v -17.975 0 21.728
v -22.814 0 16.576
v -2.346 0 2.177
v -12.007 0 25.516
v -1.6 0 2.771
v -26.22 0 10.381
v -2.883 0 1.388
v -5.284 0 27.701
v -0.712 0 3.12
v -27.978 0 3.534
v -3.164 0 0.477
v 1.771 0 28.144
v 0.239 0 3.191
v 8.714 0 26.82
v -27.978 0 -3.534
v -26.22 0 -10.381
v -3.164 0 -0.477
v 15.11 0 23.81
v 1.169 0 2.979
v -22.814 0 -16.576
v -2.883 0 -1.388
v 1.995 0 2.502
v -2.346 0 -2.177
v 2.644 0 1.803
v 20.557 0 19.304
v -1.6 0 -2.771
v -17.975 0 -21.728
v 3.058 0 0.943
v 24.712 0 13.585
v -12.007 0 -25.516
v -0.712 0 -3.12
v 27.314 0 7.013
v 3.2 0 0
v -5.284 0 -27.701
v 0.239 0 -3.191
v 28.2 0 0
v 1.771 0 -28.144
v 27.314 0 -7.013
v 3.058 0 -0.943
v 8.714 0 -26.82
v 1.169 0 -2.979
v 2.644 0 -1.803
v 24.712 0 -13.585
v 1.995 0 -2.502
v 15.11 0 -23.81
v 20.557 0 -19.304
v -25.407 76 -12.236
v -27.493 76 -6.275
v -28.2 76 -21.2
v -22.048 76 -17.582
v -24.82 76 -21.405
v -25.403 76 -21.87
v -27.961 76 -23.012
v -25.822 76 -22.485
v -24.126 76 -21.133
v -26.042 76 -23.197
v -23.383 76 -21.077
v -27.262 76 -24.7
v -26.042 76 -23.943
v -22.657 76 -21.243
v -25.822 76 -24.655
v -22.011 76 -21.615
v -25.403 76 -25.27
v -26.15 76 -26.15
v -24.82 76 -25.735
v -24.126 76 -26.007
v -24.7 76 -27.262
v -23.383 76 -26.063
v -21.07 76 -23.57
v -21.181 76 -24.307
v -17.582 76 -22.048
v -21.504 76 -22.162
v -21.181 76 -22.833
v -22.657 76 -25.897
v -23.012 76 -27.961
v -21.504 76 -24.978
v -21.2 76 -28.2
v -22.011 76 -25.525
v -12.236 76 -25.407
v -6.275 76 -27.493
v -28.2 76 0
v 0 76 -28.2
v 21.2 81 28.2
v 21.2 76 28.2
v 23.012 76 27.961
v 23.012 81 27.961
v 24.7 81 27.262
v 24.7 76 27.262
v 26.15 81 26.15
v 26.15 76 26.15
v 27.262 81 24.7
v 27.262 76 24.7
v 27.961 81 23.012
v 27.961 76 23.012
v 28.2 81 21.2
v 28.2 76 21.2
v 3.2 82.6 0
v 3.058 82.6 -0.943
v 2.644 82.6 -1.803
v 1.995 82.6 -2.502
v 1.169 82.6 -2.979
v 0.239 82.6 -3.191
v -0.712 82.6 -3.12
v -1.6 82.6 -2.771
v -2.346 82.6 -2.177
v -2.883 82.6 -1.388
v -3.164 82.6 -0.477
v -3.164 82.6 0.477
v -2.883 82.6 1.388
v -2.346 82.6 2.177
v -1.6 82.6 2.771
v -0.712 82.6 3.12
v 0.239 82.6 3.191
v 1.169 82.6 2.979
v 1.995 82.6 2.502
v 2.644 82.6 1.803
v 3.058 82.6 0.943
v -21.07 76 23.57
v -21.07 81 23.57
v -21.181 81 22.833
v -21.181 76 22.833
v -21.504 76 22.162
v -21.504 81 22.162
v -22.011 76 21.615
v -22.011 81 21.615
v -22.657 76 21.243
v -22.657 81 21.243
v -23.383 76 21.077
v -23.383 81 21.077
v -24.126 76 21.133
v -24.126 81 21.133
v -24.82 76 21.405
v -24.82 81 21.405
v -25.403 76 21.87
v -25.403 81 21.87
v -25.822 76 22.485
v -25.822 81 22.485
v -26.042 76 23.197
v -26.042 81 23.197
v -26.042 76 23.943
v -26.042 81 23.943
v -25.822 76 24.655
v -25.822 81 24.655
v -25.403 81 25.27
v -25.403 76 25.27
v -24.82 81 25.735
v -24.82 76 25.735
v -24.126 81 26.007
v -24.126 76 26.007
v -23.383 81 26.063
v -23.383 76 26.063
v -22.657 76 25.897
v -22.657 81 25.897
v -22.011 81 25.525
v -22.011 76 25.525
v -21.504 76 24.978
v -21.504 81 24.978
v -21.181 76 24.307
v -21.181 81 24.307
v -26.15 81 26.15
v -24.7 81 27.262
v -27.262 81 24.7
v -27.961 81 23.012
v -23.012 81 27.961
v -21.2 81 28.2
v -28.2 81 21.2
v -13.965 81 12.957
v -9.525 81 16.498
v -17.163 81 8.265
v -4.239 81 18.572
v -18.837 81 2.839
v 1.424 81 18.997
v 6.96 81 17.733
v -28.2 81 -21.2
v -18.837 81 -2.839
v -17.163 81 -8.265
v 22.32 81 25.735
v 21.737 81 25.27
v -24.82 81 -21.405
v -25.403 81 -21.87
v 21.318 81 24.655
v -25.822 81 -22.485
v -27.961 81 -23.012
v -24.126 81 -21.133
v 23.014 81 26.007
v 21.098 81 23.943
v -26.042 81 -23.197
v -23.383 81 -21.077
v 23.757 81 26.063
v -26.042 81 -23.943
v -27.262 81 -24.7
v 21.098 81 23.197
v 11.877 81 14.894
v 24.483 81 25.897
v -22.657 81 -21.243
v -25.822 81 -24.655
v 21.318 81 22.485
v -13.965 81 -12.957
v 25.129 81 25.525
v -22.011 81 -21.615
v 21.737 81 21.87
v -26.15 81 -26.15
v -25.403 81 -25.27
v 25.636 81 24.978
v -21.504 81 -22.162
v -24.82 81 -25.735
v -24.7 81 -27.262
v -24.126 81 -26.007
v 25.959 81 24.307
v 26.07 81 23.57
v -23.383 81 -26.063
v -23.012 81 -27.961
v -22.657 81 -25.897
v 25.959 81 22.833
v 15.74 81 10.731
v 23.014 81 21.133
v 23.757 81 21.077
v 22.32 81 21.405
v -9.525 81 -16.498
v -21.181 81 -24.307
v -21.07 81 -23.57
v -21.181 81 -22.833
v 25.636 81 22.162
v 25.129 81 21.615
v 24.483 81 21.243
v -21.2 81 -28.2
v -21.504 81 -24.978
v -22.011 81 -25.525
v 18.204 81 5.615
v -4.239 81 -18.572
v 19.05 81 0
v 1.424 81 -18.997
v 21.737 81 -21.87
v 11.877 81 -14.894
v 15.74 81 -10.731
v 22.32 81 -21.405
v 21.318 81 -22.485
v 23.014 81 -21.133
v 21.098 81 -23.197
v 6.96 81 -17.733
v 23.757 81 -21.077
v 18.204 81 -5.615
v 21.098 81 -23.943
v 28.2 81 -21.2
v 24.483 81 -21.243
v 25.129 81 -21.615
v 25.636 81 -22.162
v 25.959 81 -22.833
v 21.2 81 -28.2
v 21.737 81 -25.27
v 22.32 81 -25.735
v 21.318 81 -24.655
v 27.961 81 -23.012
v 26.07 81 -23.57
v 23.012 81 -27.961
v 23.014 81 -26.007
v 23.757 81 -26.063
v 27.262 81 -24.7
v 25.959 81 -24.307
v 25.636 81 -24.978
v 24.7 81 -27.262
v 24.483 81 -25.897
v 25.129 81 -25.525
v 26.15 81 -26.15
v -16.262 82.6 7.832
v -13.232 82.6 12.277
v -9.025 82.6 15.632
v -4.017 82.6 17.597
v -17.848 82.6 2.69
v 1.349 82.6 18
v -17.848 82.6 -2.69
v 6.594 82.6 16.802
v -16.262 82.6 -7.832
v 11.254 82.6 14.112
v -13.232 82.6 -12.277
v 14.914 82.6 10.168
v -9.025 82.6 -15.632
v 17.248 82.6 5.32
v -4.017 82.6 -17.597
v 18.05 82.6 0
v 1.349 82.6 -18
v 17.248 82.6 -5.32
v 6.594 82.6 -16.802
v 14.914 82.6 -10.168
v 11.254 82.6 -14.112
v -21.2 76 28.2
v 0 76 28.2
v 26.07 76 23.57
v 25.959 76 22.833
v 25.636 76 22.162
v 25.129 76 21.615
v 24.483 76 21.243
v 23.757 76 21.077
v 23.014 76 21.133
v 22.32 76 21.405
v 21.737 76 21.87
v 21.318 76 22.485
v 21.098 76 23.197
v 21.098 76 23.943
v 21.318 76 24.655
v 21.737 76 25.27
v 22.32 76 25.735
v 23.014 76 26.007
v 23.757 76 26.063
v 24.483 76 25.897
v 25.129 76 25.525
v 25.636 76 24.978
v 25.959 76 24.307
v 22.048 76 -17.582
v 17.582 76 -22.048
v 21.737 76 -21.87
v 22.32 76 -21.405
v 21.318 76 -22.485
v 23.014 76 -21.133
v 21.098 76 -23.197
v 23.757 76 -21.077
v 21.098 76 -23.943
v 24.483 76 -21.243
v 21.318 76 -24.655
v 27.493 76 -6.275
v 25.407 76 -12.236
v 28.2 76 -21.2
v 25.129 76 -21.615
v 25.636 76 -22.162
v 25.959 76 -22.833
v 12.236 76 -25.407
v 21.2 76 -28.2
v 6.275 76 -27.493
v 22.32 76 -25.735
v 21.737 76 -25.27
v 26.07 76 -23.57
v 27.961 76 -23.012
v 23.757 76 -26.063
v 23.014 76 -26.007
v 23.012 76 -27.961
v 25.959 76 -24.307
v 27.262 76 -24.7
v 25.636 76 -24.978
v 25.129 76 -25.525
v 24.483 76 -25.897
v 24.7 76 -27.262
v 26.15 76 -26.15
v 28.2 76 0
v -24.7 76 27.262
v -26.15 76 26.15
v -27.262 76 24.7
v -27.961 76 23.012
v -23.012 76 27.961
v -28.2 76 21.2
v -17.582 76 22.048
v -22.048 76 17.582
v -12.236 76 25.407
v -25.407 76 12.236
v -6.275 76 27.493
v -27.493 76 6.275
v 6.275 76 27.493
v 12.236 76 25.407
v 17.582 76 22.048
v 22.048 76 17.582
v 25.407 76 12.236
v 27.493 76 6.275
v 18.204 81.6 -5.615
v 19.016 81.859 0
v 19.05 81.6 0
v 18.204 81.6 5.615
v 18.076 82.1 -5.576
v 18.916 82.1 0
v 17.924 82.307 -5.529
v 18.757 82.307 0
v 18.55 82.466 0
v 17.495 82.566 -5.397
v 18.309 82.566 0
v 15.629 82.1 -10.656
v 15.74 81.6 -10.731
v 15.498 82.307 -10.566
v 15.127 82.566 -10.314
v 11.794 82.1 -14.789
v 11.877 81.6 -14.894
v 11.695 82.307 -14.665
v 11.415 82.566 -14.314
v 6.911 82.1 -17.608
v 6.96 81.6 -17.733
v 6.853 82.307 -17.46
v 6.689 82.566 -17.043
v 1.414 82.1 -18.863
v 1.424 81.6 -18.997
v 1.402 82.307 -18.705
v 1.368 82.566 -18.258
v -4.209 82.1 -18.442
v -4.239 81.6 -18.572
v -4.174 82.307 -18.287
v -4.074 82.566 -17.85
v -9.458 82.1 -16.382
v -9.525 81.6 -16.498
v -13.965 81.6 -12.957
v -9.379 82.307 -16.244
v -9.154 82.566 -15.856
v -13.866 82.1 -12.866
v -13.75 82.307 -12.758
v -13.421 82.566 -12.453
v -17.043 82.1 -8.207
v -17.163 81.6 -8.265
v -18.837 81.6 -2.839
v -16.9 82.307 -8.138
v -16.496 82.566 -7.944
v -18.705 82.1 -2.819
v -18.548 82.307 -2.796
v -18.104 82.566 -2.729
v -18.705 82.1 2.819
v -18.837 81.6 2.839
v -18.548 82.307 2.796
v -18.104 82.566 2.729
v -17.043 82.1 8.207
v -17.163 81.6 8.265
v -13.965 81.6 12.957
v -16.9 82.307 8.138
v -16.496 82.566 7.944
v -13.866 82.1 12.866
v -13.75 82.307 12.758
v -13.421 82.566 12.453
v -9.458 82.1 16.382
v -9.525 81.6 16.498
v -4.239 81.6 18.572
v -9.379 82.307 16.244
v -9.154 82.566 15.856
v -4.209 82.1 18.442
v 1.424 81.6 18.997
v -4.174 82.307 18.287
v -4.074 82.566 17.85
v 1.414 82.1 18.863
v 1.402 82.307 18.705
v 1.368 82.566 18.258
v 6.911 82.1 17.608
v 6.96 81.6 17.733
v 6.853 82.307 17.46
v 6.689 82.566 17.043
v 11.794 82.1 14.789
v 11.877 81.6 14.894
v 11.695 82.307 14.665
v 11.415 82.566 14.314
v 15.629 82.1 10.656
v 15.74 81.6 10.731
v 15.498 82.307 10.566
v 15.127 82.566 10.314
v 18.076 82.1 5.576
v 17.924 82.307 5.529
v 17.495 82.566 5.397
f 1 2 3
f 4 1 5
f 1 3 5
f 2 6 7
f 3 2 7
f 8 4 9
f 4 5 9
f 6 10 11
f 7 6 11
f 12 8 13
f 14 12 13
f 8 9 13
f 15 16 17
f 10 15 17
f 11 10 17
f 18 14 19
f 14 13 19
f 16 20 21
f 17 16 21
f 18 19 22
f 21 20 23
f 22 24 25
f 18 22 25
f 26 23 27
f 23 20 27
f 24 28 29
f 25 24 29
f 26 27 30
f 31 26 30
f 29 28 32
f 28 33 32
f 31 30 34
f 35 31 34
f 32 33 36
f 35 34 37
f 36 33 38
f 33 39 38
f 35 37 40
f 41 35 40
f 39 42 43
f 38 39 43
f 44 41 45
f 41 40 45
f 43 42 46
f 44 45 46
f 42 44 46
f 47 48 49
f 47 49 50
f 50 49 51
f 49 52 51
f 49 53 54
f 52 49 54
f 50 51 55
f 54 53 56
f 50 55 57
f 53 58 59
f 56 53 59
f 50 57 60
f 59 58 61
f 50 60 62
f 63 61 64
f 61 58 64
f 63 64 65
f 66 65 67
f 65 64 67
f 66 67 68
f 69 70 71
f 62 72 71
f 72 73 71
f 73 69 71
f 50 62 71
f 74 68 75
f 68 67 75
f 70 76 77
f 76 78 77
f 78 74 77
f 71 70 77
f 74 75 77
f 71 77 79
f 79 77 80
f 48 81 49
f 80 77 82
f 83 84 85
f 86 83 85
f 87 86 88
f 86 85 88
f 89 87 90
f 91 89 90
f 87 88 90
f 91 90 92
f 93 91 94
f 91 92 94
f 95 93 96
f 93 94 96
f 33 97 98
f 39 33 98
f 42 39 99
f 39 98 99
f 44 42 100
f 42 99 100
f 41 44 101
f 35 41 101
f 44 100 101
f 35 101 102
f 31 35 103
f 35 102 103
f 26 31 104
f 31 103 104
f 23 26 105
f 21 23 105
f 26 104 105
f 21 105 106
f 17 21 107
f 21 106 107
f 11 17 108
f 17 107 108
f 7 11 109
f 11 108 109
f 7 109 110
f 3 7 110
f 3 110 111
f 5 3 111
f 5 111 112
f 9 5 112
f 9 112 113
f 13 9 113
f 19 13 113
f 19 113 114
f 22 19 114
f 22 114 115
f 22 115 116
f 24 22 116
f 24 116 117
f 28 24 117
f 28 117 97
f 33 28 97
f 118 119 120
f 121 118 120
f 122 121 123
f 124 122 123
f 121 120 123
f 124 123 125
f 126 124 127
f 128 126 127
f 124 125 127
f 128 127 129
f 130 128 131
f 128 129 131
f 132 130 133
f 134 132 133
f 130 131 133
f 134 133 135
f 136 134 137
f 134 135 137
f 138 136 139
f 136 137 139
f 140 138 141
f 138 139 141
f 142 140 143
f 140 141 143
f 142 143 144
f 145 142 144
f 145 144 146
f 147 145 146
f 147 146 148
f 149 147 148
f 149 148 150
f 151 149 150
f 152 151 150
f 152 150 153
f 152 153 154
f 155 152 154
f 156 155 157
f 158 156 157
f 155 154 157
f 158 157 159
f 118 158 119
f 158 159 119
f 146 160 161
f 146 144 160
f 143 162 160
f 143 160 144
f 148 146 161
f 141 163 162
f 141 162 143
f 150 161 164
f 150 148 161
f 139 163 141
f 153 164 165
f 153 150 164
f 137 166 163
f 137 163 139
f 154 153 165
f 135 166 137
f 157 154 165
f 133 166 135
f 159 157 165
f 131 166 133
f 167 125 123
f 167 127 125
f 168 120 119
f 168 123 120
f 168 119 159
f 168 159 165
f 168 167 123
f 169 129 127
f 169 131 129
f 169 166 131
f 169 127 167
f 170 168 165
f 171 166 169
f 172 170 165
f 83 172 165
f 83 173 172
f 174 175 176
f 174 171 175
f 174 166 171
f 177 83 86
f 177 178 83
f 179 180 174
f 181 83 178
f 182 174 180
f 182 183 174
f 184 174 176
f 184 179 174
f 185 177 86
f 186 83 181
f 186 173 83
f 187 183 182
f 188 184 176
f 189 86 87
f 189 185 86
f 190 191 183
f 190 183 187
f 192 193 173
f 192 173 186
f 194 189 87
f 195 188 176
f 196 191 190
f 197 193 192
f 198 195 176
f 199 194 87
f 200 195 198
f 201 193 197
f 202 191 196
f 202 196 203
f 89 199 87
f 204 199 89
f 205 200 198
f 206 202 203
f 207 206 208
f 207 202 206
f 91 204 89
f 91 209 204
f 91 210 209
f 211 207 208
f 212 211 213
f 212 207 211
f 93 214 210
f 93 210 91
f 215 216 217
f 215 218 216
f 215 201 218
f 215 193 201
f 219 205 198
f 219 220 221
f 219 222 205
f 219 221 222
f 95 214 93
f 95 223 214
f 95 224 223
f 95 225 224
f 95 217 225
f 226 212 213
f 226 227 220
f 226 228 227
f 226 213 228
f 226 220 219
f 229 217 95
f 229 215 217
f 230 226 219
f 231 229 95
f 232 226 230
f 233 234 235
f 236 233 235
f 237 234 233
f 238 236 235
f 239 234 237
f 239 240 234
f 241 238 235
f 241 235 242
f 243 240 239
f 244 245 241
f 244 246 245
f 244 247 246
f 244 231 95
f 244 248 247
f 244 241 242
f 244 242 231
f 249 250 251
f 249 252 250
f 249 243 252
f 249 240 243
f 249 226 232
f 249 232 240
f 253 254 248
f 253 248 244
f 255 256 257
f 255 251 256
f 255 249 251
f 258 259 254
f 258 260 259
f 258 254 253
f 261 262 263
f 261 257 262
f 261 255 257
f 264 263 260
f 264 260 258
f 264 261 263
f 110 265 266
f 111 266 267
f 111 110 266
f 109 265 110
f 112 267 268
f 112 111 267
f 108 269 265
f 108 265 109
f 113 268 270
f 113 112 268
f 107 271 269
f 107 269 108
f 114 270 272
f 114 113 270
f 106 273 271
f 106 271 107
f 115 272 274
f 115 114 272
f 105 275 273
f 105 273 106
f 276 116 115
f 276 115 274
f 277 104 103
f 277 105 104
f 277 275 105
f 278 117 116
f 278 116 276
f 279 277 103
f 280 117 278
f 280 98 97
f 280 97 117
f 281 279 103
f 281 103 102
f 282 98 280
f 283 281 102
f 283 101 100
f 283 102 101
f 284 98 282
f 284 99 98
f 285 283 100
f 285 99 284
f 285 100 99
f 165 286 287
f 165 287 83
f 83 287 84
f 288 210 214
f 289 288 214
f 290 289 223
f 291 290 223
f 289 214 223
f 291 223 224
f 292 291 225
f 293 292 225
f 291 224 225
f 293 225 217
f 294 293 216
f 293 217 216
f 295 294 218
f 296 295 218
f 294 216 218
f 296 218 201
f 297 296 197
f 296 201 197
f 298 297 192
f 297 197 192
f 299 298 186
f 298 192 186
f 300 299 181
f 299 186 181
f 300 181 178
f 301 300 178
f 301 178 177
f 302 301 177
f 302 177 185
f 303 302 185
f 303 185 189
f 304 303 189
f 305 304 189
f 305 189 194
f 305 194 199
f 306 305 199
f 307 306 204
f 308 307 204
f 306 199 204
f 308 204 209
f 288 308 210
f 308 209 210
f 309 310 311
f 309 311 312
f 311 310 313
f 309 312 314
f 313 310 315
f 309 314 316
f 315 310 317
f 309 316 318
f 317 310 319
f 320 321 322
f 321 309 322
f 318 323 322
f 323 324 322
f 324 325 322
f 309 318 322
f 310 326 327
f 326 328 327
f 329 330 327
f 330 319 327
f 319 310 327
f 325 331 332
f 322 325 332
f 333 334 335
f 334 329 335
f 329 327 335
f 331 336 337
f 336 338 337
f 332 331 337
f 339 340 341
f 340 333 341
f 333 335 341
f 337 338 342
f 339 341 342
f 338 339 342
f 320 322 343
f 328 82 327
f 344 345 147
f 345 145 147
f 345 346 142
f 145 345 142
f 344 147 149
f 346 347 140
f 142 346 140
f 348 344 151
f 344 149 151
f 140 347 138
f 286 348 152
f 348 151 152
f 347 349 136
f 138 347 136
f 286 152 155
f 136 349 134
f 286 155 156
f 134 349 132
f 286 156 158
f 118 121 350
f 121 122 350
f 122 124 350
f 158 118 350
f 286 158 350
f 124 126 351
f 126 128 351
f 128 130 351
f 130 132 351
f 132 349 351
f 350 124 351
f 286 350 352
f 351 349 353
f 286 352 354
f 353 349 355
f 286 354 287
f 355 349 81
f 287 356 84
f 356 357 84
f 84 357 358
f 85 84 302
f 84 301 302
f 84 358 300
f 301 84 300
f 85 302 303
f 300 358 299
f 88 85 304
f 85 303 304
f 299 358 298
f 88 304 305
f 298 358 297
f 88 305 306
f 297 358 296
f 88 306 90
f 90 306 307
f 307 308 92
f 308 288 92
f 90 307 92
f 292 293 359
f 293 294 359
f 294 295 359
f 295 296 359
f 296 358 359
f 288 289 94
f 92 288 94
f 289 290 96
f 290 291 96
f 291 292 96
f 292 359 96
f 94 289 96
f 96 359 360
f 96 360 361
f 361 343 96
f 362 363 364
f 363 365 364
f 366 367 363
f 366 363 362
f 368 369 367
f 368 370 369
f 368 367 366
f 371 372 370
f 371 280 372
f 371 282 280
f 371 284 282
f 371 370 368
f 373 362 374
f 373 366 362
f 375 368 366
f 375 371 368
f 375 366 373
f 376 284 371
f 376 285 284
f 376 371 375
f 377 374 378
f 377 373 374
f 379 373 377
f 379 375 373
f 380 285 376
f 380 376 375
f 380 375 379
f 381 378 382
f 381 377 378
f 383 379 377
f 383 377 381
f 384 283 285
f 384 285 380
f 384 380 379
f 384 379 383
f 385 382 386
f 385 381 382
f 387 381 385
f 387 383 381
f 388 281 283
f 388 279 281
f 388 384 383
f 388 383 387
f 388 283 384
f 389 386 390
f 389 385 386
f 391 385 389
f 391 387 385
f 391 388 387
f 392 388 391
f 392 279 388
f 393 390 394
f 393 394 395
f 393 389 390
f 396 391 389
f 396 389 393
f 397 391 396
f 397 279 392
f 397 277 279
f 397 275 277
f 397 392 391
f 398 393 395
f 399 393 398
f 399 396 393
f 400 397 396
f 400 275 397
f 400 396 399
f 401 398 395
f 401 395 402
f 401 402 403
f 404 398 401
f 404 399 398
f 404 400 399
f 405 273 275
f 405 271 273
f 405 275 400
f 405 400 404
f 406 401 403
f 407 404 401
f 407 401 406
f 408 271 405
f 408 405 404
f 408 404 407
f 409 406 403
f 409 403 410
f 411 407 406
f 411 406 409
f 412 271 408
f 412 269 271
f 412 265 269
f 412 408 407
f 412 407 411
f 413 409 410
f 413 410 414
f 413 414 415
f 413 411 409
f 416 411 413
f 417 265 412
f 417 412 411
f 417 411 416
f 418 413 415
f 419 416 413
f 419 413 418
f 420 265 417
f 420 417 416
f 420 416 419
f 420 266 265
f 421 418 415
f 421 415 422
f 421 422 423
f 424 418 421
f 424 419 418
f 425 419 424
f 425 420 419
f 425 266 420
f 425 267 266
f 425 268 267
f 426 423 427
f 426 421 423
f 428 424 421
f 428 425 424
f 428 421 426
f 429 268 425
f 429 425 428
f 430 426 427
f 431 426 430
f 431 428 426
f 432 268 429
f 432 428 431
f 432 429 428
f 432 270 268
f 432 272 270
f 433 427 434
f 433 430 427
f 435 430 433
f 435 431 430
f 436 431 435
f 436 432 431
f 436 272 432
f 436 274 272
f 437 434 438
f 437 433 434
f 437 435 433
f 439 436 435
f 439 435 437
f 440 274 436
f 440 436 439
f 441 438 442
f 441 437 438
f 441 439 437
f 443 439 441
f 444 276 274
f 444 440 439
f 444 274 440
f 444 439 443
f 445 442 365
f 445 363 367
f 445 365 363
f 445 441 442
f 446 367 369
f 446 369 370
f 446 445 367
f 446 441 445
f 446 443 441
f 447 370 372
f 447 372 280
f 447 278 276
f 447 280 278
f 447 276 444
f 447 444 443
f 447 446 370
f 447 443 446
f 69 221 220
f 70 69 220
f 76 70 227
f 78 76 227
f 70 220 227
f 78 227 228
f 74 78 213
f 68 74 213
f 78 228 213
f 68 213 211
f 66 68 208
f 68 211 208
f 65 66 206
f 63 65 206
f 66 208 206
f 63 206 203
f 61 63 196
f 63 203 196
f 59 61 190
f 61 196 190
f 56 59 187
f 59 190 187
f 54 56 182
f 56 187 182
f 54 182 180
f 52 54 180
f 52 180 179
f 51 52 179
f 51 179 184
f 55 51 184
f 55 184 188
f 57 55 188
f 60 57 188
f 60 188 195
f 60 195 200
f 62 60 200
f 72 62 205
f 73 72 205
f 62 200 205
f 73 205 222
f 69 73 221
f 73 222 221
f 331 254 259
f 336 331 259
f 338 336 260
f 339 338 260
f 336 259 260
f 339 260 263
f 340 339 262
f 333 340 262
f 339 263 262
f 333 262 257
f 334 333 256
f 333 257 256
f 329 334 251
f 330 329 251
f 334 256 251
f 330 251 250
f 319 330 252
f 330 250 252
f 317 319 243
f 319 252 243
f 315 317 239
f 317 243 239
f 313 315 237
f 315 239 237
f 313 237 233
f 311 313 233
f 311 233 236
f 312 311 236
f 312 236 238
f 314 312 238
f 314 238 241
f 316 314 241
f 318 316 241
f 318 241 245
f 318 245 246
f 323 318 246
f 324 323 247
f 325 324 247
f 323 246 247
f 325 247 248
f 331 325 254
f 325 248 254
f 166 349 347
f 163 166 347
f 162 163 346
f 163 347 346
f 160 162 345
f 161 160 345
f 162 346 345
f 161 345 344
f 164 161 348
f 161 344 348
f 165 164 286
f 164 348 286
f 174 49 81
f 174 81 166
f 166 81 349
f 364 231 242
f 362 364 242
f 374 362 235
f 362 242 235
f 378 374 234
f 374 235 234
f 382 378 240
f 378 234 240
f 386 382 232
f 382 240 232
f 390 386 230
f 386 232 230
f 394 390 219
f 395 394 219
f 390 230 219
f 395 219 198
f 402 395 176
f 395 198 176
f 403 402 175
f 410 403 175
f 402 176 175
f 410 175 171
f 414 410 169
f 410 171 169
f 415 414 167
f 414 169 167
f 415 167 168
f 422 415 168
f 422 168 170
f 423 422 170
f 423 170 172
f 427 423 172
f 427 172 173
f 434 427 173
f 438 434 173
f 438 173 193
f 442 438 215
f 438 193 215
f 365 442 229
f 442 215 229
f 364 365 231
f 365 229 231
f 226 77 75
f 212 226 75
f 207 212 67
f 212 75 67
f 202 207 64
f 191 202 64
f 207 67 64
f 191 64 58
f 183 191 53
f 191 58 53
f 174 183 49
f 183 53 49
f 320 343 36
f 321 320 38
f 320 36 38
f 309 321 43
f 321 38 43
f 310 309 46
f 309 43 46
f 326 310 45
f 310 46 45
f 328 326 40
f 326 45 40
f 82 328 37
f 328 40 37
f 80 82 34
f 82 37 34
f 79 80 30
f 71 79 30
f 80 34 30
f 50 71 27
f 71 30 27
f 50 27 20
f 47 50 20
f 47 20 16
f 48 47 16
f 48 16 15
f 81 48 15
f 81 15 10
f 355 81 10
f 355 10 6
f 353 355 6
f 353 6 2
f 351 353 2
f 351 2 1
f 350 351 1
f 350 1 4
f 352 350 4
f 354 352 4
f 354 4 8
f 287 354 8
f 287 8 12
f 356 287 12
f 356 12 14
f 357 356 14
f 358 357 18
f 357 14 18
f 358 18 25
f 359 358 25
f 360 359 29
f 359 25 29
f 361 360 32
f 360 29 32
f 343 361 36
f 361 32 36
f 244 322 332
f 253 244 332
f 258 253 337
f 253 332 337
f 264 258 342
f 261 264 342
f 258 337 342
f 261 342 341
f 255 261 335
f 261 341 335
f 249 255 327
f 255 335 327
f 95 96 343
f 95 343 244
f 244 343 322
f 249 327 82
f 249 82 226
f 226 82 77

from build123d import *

# Parameters (mm, degrees)
SKETCH1_R           = 28.2
BOSS_EXTRUDE1_DEPTH = 76
BOSS_EXTRUDE3_DEPTH = 5
SKETCH4_R           = 2.5
CUT_EXTRUDE1_DEPTH  = 5
SKETCH5_R           = 19.05
BOSS_EXTRUDE4_DEPTH = 1.6
FILLET1_R           = 1
SKETCH7_R           = 3.2
CUT_EXTRUDE3_DEPTH  = 83.6


with BuildPart() as part:
    # Sketch1 → Boss-Extrude1 (new body)
    with BuildSketch(Plane(origin=(0, 0, 0), x_dir=(1, 0, 0), z_dir=(0, 1, 0))):
        Circle(SKETCH1_R)
    extrude(amount=BOSS_EXTRUDE1_DEPTH)

    # Sketch2 → Boss-Extrude3 (add)
    with BuildSketch(Plane(origin=(0, 76, 0), x_dir=(1, 0, 0), z_dir=(0, 1, 0))):
        with BuildLine():
            Line((-21.2, -28.2), (21.2, -28.2))
            ThreePointArc((21.2, -28.2), (26.149747468, -26.149747468), (28.2, -21.2))
            Line((28.2, -21.2), (28.2, 21.2))
            ThreePointArc((28.2, 21.2), (26.149747468, 26.149747468), (21.2, 28.2))
            Line((21.2, 28.2), (-21.2, 28.2))
            ThreePointArc((-21.2, 28.2), (-26.149747468, 26.149747468), (-28.2, 21.2))
            Line((-28.2, 21.2), (-28.2, -21.2))
            ThreePointArc((-28.2, -21.2), (-26.149747468, -26.149747468), (-21.2, -28.2))
        make_face()
    extrude(amount=BOSS_EXTRUDE3_DEPTH)

    # Sketch4 → Cut-Extrude1 (cut)
    with BuildSketch(Plane(origin=(0, 81, 0), x_dir=(1, 0, 0), z_dir=(0, 1, 0))):
        with Locations((-23.57, 23.57)):
            Circle(SKETCH4_R)
        with Locations((23.57, 23.57)):
            Circle(SKETCH4_R)
        with Locations((-23.57, -23.57)):
            Circle(SKETCH4_R)
        with Locations((23.57, -23.57)):
            Circle(SKETCH4_R)
    extrude(amount=-CUT_EXTRUDE1_DEPTH, mode=Mode.SUBTRACT)

    # Sketch5 → Boss-Extrude4 (add)
    with BuildSketch(Plane(origin=(0, 81, 0), x_dir=(1, 0, 0), z_dir=(0, 1, 0))):
        Circle(SKETCH5_R)
    extrude(amount=BOSS_EXTRUDE4_DEPTH)

    # Fillet1
    fillet1_edges = [part.edges().sort_by_distance(p)[0] for p in [
        (-19.05, 82.6, 0),
    ]]
    fillet(fillet1_edges, radius=FILLET1_R)

    # Sketch7 → Cut-Extrude3 (cut, through all)
    with BuildSketch(Plane(origin=(0, 82.6, 0), x_dir=(1, 0, 0), z_dir=(0, 1, 0))):
        Circle(SKETCH7_R)
    extrude(amount=-CUT_EXTRUDE3_DEPTH, mode=Mode.SUBTRACT)


solid = part.part
